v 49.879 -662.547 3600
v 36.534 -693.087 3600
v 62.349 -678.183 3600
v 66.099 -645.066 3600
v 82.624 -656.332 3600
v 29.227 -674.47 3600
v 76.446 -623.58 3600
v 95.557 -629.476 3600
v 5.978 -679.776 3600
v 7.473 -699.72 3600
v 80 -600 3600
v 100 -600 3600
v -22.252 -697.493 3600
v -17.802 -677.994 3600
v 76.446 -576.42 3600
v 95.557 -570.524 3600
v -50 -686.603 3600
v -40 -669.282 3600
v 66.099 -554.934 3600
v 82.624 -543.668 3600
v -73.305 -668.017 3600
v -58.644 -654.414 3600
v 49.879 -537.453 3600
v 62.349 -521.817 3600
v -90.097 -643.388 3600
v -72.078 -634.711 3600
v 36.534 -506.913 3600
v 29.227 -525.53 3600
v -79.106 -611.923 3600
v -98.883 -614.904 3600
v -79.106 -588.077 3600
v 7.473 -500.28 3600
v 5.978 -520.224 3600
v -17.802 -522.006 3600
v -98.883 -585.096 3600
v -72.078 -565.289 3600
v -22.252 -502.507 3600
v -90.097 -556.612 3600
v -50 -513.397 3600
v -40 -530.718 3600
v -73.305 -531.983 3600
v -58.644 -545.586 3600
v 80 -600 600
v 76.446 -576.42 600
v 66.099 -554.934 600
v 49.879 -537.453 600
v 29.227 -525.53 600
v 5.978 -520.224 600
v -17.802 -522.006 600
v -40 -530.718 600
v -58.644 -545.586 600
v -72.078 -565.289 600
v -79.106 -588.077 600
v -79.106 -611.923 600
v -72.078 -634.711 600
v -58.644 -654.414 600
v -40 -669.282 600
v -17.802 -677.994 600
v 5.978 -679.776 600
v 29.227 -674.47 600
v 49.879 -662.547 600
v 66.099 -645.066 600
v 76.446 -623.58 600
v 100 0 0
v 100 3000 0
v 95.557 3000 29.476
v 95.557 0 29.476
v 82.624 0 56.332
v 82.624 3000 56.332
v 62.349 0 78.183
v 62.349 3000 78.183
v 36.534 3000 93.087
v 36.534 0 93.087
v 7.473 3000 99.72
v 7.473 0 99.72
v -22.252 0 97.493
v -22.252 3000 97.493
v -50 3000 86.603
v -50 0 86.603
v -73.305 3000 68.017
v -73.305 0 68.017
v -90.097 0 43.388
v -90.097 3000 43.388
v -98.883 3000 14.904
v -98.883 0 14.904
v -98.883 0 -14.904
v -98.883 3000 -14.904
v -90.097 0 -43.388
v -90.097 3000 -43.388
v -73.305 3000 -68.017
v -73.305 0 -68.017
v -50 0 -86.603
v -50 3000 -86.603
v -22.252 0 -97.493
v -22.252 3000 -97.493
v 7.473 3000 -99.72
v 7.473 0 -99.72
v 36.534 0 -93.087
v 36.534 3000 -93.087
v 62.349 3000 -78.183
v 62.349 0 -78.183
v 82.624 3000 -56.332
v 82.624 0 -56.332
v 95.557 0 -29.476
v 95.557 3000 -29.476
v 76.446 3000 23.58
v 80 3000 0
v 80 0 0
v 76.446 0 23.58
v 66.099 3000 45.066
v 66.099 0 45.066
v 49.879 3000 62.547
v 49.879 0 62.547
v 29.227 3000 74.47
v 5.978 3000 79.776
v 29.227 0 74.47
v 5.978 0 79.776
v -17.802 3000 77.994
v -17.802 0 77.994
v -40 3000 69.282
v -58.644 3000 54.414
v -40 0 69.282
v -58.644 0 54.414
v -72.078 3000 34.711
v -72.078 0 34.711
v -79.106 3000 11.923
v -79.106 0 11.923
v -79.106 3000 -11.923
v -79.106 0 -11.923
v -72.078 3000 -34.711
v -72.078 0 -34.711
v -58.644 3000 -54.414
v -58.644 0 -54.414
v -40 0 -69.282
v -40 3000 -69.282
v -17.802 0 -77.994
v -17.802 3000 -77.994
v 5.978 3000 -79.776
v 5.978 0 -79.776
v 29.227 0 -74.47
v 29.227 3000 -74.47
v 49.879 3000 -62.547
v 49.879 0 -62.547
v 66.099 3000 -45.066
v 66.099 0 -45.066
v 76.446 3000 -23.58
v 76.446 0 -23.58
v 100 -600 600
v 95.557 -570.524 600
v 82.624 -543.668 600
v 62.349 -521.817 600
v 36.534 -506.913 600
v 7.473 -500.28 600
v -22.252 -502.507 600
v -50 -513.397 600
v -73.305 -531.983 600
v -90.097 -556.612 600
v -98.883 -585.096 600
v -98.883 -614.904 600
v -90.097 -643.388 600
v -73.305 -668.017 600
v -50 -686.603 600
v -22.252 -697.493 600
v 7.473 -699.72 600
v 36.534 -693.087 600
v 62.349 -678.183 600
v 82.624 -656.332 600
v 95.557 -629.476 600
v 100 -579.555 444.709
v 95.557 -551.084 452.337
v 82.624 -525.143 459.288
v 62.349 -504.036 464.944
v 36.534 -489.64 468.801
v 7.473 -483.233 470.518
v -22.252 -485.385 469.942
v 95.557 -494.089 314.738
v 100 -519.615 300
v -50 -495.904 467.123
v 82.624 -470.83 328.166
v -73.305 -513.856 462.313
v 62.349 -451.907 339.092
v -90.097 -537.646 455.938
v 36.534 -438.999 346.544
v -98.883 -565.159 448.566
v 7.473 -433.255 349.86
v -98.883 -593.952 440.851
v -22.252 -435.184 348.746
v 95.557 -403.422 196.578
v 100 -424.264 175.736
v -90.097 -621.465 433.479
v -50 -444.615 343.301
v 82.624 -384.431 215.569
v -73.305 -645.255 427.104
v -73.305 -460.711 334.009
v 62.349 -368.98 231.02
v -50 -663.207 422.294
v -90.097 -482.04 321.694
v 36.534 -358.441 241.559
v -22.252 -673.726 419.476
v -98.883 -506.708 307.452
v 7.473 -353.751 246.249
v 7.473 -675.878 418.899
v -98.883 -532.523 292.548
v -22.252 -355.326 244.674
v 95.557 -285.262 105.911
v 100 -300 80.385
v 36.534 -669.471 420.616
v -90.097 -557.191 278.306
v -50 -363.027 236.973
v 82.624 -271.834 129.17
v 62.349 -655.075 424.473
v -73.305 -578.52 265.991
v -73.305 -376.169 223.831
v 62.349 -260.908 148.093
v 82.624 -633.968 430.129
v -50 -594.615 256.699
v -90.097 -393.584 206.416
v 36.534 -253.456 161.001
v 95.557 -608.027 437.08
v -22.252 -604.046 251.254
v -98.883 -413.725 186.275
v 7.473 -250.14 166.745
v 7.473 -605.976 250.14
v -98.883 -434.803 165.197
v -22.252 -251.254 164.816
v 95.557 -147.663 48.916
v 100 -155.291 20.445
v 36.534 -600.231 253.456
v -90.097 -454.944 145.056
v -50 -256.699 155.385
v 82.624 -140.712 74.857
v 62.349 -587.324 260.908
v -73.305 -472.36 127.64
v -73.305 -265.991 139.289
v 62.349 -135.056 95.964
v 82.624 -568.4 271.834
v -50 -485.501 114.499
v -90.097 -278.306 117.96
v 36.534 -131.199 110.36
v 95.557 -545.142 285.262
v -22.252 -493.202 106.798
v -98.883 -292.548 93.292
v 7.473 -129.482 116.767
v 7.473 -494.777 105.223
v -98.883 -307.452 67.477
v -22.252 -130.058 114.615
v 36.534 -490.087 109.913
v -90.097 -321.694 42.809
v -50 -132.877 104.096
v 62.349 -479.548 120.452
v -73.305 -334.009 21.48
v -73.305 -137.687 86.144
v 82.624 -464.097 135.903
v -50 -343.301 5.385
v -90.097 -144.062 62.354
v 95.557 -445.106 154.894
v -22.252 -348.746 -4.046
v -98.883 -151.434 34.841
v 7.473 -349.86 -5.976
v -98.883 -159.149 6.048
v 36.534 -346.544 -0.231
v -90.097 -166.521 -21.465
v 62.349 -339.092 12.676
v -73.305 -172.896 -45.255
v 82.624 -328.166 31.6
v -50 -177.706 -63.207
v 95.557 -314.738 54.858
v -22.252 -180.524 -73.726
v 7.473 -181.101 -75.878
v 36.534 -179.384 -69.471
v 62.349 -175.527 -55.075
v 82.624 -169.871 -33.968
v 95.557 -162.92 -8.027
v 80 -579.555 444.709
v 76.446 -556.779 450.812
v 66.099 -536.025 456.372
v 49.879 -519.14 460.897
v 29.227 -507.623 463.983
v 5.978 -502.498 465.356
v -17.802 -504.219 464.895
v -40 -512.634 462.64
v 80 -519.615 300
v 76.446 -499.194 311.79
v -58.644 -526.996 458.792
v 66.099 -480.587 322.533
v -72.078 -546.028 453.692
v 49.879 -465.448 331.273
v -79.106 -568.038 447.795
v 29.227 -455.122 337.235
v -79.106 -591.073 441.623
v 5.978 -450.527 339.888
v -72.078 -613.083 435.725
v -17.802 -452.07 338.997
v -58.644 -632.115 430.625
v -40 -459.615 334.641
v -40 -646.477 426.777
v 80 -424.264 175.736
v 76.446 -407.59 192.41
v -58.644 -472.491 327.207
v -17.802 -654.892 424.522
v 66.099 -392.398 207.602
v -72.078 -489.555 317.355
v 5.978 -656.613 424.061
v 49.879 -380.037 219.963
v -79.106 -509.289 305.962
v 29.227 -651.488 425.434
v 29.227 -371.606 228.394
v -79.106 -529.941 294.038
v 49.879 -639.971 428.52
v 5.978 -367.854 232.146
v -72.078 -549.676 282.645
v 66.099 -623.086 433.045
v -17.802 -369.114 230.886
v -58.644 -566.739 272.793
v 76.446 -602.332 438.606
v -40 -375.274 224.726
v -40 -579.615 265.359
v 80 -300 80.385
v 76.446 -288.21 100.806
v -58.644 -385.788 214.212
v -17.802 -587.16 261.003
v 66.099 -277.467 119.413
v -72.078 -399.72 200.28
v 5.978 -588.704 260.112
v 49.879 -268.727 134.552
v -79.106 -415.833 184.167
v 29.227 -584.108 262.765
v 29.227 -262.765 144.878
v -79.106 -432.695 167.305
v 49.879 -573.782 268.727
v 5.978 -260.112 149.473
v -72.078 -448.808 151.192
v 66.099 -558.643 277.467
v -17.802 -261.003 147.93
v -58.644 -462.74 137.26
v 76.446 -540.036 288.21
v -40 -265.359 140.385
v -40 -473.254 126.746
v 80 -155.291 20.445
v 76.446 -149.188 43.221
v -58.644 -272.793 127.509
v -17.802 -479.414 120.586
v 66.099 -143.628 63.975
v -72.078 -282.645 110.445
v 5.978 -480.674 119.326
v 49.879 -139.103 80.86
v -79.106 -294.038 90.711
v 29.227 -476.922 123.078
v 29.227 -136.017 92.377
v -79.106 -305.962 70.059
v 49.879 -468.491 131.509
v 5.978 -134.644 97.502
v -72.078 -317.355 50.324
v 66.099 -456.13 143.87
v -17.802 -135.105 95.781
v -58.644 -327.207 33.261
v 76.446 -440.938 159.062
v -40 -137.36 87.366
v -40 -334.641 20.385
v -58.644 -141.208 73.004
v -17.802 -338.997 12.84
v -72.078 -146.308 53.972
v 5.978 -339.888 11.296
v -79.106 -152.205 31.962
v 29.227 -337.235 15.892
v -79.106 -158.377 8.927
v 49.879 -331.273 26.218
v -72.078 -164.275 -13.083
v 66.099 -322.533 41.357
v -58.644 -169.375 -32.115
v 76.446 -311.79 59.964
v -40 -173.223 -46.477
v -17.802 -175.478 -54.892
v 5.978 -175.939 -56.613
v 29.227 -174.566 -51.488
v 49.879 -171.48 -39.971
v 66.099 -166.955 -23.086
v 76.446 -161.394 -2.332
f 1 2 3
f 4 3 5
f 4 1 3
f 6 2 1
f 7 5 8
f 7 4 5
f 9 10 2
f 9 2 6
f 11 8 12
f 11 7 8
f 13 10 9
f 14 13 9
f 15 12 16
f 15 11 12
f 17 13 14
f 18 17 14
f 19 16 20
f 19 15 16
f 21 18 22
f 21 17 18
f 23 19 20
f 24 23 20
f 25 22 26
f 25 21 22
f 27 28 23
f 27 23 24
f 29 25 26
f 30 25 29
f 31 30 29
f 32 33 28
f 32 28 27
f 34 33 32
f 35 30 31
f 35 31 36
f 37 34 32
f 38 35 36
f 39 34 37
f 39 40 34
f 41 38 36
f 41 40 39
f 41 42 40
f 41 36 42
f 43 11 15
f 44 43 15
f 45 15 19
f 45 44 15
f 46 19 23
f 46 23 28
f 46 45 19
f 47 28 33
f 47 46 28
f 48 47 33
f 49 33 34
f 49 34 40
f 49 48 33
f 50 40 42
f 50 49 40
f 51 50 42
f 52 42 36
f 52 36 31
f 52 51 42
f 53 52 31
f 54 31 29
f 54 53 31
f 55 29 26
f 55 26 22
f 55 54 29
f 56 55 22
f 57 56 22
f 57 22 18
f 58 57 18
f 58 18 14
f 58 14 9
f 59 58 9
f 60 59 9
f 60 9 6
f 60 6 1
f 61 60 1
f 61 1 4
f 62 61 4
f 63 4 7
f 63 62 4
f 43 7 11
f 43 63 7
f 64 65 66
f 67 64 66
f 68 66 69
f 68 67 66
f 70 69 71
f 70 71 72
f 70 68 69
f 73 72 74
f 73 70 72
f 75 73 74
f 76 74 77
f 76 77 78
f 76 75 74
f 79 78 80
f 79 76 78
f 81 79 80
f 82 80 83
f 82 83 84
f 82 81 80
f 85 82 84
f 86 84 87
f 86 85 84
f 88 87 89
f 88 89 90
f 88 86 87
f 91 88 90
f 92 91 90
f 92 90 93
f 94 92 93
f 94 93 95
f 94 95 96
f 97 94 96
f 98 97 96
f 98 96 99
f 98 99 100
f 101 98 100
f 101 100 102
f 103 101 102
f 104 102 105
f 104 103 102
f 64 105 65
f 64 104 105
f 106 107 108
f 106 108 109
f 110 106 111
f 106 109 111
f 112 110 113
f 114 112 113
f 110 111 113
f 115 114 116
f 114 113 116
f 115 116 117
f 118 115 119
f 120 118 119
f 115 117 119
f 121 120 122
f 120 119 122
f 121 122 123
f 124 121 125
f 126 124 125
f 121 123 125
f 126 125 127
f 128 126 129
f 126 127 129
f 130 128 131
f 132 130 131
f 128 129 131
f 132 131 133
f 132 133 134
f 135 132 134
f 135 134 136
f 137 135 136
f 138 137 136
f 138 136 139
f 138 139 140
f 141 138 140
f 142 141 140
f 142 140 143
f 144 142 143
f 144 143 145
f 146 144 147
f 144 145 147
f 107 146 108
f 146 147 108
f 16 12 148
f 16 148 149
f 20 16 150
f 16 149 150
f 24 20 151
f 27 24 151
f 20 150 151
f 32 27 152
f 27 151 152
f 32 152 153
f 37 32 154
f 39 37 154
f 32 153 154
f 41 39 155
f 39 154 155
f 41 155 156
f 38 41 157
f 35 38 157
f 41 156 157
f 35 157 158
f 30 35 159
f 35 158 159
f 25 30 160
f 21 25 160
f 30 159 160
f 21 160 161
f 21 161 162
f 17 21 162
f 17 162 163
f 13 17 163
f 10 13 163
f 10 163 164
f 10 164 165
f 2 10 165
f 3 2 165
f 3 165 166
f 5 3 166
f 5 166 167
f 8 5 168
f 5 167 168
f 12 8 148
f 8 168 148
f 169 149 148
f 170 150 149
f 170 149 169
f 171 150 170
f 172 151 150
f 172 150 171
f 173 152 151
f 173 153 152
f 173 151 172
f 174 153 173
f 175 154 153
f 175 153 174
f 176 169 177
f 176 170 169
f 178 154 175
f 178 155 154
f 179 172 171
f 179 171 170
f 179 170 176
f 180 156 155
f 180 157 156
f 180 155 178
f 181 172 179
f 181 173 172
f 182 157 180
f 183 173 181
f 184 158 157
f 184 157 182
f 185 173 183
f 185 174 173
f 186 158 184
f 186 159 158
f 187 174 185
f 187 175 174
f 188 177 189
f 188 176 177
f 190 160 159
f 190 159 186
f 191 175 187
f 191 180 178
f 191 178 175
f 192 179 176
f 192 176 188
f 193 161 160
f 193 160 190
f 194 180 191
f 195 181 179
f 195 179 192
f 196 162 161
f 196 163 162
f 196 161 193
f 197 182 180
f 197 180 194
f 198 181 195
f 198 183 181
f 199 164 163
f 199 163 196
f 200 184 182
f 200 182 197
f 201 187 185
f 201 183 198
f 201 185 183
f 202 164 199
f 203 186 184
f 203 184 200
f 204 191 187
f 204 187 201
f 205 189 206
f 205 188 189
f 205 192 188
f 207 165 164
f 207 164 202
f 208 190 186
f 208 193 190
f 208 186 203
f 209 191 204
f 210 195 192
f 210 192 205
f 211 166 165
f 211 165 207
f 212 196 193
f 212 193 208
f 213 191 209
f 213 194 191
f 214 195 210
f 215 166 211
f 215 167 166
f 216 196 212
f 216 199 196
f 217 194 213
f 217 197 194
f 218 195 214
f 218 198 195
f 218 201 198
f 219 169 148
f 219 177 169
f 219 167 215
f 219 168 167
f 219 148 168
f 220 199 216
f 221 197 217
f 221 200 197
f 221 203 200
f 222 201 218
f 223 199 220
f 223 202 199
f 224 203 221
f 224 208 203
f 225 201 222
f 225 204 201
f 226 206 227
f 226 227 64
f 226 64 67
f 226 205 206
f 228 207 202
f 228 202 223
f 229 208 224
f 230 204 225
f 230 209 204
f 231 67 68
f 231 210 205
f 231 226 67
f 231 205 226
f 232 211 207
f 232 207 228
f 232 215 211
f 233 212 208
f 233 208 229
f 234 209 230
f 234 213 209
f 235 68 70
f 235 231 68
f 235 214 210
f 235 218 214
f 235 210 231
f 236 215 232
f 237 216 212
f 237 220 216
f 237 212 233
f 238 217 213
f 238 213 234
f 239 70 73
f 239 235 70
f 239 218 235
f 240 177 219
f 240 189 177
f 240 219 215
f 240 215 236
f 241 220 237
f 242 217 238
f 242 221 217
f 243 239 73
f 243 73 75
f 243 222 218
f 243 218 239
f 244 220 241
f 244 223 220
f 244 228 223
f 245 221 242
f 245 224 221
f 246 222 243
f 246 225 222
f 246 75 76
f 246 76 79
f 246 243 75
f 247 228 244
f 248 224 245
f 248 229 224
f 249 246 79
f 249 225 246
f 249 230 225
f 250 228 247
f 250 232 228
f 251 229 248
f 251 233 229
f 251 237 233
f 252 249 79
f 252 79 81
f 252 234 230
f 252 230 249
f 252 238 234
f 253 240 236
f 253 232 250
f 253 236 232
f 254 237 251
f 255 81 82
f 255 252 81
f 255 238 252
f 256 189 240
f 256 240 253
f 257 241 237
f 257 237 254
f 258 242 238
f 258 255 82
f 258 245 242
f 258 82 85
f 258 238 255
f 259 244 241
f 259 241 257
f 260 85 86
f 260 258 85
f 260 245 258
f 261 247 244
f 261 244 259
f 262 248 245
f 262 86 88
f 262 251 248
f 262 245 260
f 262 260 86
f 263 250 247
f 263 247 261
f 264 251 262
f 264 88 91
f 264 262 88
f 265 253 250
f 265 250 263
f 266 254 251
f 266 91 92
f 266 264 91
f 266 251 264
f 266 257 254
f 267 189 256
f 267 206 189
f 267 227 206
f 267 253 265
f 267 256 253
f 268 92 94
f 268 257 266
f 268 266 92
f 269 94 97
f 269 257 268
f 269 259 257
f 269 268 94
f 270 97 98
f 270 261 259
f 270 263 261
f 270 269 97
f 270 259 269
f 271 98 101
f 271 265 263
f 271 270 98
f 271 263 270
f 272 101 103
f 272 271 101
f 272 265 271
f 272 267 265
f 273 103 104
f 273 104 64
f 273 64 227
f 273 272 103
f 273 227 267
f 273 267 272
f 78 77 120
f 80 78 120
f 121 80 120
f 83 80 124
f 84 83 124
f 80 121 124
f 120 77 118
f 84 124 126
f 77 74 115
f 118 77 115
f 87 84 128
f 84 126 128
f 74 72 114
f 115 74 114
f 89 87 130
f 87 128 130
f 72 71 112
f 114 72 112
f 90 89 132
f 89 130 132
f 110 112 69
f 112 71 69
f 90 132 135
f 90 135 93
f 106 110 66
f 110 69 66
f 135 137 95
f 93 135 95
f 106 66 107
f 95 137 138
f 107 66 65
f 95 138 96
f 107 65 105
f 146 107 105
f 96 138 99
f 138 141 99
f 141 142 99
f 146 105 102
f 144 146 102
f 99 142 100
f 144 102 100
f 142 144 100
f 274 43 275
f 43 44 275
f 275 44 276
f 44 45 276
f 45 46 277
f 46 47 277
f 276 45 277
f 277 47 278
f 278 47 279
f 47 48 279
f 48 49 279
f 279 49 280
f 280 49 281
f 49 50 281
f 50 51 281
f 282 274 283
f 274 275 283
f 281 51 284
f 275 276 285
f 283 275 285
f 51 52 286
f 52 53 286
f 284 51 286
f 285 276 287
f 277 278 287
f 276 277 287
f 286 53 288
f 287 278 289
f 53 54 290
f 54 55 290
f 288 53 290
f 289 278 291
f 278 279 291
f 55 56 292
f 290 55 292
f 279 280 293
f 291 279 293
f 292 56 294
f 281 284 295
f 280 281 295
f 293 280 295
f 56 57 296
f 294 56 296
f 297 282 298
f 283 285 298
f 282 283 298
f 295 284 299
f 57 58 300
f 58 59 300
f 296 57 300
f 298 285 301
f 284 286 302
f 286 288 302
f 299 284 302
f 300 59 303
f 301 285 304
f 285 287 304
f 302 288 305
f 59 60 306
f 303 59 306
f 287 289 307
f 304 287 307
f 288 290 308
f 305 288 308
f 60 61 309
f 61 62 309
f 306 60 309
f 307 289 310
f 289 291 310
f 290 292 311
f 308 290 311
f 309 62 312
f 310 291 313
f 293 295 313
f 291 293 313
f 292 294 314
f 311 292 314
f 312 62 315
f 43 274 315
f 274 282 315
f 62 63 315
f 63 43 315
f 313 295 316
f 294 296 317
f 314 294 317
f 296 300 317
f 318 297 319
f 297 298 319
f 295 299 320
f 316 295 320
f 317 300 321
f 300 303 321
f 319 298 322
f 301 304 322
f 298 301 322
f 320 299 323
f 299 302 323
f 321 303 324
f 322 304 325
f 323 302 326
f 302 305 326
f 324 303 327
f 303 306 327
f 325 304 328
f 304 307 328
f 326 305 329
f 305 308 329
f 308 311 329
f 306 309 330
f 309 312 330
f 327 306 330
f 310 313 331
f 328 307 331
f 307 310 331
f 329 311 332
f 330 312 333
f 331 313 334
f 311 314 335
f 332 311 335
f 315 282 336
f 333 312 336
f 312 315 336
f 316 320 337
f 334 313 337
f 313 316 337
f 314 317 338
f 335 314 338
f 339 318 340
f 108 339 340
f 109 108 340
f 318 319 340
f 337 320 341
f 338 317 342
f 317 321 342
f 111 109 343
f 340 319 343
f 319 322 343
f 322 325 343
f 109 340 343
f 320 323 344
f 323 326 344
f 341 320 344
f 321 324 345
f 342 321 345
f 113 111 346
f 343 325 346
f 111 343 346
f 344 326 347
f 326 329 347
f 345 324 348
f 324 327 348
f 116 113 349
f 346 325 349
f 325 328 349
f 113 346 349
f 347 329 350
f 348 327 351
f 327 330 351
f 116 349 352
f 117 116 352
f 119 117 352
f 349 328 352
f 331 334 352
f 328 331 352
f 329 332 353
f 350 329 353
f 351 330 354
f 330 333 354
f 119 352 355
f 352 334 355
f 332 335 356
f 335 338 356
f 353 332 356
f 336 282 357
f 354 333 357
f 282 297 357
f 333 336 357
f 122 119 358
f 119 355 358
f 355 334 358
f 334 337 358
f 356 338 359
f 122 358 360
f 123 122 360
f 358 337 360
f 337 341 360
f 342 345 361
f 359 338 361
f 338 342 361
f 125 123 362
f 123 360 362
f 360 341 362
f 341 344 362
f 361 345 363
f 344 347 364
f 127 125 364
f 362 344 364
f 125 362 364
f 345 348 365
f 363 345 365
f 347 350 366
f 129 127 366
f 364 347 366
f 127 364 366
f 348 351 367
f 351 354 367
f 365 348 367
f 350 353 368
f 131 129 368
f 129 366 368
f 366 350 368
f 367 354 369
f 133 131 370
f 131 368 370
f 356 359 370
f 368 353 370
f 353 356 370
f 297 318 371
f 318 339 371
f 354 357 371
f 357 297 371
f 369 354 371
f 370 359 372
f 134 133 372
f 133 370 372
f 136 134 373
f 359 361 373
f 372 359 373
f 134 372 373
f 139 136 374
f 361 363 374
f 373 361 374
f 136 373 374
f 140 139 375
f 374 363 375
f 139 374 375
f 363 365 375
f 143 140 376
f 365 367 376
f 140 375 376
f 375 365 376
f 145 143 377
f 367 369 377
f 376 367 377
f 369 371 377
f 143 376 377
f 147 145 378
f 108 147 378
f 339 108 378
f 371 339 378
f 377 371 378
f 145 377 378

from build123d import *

# Parameters (mm, degrees)
F0_R     = 100
F0_R_2   = 80
F3_DEPTH = 3000
F4_DEPTH = 3000


with BuildPart() as f2:
    # F2: sweep along a path in F1
    with BuildLine(Plane.YZ) as f2_path:
        ThreePointArc((-600, 600), (-424.2640687119, 175.7359312881), (0, 0))
    # F0 (on Front) → F2 (sweep)
    with BuildSketch(Plane.XZ):
        Circle(F0_R)
        Circle(F0_R_2, mode=Mode.SUBTRACT)
    sweep(path=f2_path.line)

    # F3 (add): a face of the model
    f3_faces = [f2.faces().sort_by_distance(p)[0] for p in [
        (-97.1715728753, 0, 0),
    ]]
    extrude(f3_faces, amount=F3_DEPTH)

    # F4 (add): a face of the model
    f4_faces = [f2.faces().sort_by_distance(p)[0] for p in [
        (-97.1715728753, -600, 600),
    ]]
    extrude(f4_faces, amount=F4_DEPTH)


solid = f2.part
